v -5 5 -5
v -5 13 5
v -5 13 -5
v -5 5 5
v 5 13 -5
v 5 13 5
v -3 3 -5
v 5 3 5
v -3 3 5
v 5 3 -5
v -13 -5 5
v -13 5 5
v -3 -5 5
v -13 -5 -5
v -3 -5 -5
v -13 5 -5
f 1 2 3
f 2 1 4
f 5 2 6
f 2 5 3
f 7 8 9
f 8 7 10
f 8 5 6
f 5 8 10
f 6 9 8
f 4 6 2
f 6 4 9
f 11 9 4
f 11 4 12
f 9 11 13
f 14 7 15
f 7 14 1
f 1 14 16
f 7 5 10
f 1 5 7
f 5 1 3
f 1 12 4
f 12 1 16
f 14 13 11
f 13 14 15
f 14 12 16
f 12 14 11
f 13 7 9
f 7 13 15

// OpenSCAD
rotate([90,0,180]) translate ([0, 0, 8]) cube(10, center=true);
rotate([90,0,270]) translate ([0, 0, 8]) cube(10, center=true);
